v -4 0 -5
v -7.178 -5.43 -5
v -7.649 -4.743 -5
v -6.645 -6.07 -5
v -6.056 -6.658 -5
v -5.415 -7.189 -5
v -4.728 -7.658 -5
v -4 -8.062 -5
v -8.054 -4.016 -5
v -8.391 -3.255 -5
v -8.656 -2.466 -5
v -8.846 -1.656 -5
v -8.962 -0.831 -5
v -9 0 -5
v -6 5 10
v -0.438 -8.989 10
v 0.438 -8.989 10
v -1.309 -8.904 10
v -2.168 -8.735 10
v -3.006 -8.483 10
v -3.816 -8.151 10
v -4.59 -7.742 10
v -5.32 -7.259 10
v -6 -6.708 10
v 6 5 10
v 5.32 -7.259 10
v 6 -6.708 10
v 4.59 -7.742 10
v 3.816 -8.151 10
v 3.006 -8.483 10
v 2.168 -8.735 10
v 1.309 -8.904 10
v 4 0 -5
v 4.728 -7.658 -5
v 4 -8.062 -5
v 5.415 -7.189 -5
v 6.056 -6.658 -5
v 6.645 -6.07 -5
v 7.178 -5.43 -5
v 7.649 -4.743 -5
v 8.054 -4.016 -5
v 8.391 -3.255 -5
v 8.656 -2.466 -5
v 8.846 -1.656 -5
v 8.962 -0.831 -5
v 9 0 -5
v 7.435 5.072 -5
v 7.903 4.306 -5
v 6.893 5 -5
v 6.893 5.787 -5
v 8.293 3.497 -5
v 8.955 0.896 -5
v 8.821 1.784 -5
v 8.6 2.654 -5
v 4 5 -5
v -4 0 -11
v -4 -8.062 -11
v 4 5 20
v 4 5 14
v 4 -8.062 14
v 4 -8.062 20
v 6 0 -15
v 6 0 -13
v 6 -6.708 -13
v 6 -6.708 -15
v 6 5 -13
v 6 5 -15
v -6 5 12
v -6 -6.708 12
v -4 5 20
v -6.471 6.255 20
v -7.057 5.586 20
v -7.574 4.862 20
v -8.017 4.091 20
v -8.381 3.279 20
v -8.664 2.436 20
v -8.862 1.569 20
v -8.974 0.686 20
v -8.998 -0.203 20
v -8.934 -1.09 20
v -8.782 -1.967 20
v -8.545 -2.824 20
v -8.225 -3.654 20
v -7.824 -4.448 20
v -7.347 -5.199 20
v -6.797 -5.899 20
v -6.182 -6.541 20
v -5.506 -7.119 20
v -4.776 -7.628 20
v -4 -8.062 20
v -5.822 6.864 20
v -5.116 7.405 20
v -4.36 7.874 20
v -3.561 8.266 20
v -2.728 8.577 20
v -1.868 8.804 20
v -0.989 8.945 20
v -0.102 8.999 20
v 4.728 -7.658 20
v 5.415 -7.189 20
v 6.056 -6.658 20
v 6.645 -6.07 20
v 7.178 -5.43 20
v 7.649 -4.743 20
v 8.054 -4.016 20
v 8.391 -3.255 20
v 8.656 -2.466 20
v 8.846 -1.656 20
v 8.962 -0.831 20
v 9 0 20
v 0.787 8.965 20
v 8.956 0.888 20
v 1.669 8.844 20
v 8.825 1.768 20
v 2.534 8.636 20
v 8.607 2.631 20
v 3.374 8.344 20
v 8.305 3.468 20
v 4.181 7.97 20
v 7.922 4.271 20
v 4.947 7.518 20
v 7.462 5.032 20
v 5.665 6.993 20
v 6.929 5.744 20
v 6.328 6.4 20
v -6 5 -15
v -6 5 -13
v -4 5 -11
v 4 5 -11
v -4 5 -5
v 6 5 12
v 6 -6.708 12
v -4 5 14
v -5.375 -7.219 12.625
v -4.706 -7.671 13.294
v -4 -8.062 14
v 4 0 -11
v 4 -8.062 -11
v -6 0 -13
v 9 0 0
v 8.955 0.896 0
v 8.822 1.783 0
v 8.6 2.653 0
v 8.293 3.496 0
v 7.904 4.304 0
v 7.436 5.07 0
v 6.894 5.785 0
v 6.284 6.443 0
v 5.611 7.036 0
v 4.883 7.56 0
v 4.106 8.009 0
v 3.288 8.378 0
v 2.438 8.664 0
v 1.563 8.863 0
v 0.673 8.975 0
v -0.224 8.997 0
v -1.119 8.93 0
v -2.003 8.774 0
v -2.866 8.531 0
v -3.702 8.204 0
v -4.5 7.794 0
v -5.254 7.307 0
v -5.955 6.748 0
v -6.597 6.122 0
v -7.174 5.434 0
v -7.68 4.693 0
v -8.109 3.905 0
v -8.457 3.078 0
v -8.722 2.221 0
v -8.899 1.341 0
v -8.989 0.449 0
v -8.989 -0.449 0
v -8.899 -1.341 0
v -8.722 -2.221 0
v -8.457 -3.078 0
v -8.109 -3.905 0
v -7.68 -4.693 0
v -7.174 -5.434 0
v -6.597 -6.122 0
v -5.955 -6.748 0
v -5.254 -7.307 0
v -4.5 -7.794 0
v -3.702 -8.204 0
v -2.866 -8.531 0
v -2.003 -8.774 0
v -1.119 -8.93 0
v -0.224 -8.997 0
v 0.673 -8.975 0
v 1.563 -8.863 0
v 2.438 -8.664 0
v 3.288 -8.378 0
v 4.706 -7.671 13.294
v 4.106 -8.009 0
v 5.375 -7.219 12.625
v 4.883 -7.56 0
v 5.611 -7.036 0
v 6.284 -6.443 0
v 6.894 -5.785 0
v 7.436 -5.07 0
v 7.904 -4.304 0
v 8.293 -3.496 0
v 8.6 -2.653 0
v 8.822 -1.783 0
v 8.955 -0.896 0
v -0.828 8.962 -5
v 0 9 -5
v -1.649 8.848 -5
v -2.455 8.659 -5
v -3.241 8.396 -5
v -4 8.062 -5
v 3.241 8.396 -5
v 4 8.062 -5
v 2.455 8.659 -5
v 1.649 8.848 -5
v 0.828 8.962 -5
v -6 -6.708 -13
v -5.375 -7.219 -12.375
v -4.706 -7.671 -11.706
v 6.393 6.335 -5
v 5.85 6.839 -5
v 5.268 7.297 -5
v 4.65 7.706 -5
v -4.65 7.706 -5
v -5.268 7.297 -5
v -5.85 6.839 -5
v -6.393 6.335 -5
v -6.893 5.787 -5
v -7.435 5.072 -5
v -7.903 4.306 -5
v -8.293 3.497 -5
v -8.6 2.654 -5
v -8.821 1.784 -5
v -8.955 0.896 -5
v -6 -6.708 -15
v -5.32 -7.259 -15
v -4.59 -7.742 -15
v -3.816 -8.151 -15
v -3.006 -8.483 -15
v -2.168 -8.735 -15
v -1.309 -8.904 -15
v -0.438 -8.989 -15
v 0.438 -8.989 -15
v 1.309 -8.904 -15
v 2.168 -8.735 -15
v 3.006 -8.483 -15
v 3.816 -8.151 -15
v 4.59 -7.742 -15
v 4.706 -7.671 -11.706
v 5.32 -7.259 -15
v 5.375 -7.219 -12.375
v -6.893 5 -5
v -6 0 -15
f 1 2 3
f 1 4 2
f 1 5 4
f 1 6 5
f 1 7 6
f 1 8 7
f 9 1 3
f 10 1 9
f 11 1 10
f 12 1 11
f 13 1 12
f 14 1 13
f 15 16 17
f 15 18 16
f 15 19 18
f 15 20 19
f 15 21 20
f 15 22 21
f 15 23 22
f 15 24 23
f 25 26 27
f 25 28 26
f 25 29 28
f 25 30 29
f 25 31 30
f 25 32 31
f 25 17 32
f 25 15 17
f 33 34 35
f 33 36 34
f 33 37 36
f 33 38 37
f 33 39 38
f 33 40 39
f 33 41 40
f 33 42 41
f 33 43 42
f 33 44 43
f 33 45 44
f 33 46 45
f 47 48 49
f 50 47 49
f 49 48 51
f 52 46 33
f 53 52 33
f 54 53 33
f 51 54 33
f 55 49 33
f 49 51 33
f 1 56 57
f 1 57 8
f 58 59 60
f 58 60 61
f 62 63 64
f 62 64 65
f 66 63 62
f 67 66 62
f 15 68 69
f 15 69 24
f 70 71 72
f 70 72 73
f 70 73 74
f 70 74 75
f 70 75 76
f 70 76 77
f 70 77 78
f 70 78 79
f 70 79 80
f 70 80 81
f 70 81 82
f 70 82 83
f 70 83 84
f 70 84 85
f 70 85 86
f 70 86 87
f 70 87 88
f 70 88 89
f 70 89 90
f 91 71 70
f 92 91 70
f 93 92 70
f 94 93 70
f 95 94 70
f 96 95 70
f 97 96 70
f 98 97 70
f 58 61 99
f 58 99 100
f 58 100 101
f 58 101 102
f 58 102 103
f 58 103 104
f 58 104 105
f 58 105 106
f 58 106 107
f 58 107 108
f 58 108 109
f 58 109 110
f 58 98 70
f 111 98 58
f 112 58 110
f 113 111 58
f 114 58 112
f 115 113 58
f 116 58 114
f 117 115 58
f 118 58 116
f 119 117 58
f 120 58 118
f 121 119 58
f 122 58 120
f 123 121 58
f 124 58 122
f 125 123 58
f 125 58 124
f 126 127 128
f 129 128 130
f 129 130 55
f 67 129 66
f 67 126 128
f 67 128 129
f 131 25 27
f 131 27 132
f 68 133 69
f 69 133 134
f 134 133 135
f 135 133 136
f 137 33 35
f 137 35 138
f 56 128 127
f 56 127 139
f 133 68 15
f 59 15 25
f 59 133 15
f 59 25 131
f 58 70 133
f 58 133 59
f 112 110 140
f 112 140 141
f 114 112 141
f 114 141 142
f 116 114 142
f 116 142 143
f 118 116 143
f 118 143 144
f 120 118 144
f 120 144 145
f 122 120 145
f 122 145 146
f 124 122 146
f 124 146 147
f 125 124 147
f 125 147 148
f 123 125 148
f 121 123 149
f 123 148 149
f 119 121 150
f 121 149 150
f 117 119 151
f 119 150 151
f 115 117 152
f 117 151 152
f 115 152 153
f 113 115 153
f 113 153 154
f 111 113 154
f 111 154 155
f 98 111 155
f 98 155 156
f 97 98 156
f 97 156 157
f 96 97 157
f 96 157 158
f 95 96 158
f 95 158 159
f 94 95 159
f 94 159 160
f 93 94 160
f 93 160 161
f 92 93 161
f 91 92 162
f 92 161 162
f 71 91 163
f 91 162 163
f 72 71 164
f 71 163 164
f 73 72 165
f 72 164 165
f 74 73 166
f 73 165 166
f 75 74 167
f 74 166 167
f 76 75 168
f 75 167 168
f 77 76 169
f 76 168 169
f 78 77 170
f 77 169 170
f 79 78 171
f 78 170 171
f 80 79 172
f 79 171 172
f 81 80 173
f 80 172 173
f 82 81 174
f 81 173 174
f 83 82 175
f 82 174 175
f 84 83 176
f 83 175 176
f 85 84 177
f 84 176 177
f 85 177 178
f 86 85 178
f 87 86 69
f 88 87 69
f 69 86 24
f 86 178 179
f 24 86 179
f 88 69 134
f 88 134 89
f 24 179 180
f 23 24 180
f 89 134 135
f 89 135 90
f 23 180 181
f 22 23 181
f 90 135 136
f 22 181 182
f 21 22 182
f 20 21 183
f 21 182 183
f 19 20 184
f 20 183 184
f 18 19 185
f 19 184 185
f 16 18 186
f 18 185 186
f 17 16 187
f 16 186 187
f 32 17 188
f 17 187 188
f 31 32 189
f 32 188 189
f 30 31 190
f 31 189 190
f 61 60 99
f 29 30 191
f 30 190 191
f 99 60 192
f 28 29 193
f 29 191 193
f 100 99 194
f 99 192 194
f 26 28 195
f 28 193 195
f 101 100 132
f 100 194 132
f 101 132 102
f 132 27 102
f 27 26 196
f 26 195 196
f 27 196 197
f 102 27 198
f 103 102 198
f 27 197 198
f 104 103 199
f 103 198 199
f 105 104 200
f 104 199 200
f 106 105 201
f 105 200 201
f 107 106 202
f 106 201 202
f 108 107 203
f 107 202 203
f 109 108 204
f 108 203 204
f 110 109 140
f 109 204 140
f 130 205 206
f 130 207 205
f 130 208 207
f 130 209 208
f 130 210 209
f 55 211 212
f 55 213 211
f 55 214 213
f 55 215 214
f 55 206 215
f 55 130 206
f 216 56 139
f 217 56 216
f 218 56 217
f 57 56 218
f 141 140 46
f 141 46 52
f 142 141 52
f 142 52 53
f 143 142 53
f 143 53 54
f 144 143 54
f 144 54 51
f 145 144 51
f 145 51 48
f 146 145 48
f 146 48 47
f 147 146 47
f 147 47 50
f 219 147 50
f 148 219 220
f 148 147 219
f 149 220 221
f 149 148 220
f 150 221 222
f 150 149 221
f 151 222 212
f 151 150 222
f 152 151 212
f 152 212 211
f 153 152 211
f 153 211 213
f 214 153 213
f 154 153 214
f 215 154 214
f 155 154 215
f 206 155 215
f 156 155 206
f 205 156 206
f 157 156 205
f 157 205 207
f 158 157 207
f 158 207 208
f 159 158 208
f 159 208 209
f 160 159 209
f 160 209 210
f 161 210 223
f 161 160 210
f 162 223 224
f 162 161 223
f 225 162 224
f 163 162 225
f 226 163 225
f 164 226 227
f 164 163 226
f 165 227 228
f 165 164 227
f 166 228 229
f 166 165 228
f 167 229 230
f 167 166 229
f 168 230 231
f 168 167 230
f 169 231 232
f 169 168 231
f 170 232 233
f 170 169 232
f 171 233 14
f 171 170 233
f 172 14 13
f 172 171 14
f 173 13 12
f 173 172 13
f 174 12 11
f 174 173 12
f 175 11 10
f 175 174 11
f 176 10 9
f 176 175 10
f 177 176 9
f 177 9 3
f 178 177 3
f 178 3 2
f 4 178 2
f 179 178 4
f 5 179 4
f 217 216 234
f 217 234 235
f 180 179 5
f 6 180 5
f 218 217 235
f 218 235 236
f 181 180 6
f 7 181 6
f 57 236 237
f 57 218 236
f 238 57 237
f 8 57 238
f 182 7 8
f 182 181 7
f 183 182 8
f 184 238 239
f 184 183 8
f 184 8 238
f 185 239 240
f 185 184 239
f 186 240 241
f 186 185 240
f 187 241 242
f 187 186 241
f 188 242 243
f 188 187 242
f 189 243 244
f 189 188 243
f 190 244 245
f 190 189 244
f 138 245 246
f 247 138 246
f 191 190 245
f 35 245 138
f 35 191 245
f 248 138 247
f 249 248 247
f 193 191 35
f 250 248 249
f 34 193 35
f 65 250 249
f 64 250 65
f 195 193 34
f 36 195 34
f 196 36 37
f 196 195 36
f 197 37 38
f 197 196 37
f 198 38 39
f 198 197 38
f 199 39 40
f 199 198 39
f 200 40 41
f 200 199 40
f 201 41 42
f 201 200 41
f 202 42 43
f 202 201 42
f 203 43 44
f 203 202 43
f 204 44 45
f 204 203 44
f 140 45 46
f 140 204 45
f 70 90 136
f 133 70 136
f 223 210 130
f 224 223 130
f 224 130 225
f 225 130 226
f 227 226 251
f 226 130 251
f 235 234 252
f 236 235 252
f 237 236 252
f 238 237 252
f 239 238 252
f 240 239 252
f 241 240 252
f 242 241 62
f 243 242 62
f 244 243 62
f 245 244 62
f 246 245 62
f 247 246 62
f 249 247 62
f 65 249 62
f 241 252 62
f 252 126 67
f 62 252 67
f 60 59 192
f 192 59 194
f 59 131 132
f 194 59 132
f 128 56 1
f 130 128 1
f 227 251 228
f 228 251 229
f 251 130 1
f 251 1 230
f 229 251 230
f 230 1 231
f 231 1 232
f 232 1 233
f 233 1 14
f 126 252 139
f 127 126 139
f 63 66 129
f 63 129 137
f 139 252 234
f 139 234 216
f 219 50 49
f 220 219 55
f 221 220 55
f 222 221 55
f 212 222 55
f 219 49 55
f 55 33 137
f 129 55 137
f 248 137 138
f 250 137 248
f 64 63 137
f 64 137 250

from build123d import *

# Parameters (mm, degrees)
F0_R          = 9
F1_DEPTH      = 20
F3_DEPTH      = 5
F3_DEPTH_BACK = 25
F4_DEPTH      = 15
F5_DEPTH      = 25
F5_DEPTH_BACK = 25
F6_W          = 13.7853547931
F6_H          = 8
F7_DEPTH      = 10
F8_SIZE2      = 1.99999
F8_SIZE       = 1.99999


# Not quite as in the source:
# - a fillet or chamfer is up to 0.001 mm smaller than in the source, because OpenCascade refuses the exact size


with BuildPart() as f1:
    # F0 (on Top) → F1 (new body)
    with BuildSketch(Plane.XY):
        Circle(F0_R)
    extrude(amount=F1_DEPTH)

    # F2 (on Front) → F3 (cut, two sides)
    with BuildSketch(Plane.XZ) as f3_sk:
        Polygon((0, 10), (0, 20), (-4, 20), (-4, 12), (-6, 12), (-6, 10), align=None)
        Polygon((4, 20), (0, 20), (0, 10), (6, 10), (6, 12), (4, 12), align=None)
        Polygon((-6, -15), (0, -15), (0, -5), (-4, -5), (-4, -13), (-6, -13), align=None)
        Polygon((0, -5), (0, -15), (6, -15), (6, -13), (4, -13), (4, -5), align=None)
        Polygon((6, -13), (6, -15), (9, -15), (9, -5), (4, -5), (4, -13), align=None)
        Polygon((-9, -15), (-6, -15), (-6, -13), (-4, -13), (-4, -5), (-9, -5), align=None)
    extrude(amount=-F3_DEPTH, mode=Mode.SUBTRACT)
    extrude(f3_sk.sketch, amount=F3_DEPTH_BACK, mode=Mode.SUBTRACT)

    # F4 (add): a face of the model
    f4_faces = [f1.faces().sort_by_distance(p)[0] for p in [
        (0, 0, 0),
    ]]
    extrude(f4_faces, amount=F4_DEPTH)

    # F2 (on Front) → F5 (cut, two sides)
    with BuildSketch(Plane.XZ) as f5_sk:
        Polygon((-9, -15), (-6, -15), (-6, -13), (-4, -13), (-4, -5), (-9, -5), align=None)
        Polygon((6, -13), (6, -15), (9, -15), (9, -5), (4, -5), (4, -13), align=None)
    extrude(amount=-F5_DEPTH, mode=Mode.SUBTRACT)
    extrude(f5_sk.sketch, amount=F5_DEPTH_BACK, mode=Mode.SUBTRACT)

    # F6 (on face) → F7 (cut)
    with BuildSketch(Plane(origin=(0, 0, -15), x_dir=(1, 0, 0), z_dir=(0, 0, -1))):
        with Locations((0, -9)):
            Rectangle(F6_W, F6_H)
    extrude(amount=-F7_DEPTH, mode=Mode.SUBTRACT)

    # F8 (size 2 and 2 in the source; OpenCascade refuses exactly that, so slightly less here)
    f8_edges = [f1.edges().sort_by_distance(p)[0] for p in [
        (4, -1.531129, 12),
        (-4, -1.531129, 12),
        (-4, -1.531129, -13),
        (4, -1.531129, -13),
    ]]
    chamfer(f8_edges, length=F8_SIZE, length2=F8_SIZE2)


solid = f1.part
